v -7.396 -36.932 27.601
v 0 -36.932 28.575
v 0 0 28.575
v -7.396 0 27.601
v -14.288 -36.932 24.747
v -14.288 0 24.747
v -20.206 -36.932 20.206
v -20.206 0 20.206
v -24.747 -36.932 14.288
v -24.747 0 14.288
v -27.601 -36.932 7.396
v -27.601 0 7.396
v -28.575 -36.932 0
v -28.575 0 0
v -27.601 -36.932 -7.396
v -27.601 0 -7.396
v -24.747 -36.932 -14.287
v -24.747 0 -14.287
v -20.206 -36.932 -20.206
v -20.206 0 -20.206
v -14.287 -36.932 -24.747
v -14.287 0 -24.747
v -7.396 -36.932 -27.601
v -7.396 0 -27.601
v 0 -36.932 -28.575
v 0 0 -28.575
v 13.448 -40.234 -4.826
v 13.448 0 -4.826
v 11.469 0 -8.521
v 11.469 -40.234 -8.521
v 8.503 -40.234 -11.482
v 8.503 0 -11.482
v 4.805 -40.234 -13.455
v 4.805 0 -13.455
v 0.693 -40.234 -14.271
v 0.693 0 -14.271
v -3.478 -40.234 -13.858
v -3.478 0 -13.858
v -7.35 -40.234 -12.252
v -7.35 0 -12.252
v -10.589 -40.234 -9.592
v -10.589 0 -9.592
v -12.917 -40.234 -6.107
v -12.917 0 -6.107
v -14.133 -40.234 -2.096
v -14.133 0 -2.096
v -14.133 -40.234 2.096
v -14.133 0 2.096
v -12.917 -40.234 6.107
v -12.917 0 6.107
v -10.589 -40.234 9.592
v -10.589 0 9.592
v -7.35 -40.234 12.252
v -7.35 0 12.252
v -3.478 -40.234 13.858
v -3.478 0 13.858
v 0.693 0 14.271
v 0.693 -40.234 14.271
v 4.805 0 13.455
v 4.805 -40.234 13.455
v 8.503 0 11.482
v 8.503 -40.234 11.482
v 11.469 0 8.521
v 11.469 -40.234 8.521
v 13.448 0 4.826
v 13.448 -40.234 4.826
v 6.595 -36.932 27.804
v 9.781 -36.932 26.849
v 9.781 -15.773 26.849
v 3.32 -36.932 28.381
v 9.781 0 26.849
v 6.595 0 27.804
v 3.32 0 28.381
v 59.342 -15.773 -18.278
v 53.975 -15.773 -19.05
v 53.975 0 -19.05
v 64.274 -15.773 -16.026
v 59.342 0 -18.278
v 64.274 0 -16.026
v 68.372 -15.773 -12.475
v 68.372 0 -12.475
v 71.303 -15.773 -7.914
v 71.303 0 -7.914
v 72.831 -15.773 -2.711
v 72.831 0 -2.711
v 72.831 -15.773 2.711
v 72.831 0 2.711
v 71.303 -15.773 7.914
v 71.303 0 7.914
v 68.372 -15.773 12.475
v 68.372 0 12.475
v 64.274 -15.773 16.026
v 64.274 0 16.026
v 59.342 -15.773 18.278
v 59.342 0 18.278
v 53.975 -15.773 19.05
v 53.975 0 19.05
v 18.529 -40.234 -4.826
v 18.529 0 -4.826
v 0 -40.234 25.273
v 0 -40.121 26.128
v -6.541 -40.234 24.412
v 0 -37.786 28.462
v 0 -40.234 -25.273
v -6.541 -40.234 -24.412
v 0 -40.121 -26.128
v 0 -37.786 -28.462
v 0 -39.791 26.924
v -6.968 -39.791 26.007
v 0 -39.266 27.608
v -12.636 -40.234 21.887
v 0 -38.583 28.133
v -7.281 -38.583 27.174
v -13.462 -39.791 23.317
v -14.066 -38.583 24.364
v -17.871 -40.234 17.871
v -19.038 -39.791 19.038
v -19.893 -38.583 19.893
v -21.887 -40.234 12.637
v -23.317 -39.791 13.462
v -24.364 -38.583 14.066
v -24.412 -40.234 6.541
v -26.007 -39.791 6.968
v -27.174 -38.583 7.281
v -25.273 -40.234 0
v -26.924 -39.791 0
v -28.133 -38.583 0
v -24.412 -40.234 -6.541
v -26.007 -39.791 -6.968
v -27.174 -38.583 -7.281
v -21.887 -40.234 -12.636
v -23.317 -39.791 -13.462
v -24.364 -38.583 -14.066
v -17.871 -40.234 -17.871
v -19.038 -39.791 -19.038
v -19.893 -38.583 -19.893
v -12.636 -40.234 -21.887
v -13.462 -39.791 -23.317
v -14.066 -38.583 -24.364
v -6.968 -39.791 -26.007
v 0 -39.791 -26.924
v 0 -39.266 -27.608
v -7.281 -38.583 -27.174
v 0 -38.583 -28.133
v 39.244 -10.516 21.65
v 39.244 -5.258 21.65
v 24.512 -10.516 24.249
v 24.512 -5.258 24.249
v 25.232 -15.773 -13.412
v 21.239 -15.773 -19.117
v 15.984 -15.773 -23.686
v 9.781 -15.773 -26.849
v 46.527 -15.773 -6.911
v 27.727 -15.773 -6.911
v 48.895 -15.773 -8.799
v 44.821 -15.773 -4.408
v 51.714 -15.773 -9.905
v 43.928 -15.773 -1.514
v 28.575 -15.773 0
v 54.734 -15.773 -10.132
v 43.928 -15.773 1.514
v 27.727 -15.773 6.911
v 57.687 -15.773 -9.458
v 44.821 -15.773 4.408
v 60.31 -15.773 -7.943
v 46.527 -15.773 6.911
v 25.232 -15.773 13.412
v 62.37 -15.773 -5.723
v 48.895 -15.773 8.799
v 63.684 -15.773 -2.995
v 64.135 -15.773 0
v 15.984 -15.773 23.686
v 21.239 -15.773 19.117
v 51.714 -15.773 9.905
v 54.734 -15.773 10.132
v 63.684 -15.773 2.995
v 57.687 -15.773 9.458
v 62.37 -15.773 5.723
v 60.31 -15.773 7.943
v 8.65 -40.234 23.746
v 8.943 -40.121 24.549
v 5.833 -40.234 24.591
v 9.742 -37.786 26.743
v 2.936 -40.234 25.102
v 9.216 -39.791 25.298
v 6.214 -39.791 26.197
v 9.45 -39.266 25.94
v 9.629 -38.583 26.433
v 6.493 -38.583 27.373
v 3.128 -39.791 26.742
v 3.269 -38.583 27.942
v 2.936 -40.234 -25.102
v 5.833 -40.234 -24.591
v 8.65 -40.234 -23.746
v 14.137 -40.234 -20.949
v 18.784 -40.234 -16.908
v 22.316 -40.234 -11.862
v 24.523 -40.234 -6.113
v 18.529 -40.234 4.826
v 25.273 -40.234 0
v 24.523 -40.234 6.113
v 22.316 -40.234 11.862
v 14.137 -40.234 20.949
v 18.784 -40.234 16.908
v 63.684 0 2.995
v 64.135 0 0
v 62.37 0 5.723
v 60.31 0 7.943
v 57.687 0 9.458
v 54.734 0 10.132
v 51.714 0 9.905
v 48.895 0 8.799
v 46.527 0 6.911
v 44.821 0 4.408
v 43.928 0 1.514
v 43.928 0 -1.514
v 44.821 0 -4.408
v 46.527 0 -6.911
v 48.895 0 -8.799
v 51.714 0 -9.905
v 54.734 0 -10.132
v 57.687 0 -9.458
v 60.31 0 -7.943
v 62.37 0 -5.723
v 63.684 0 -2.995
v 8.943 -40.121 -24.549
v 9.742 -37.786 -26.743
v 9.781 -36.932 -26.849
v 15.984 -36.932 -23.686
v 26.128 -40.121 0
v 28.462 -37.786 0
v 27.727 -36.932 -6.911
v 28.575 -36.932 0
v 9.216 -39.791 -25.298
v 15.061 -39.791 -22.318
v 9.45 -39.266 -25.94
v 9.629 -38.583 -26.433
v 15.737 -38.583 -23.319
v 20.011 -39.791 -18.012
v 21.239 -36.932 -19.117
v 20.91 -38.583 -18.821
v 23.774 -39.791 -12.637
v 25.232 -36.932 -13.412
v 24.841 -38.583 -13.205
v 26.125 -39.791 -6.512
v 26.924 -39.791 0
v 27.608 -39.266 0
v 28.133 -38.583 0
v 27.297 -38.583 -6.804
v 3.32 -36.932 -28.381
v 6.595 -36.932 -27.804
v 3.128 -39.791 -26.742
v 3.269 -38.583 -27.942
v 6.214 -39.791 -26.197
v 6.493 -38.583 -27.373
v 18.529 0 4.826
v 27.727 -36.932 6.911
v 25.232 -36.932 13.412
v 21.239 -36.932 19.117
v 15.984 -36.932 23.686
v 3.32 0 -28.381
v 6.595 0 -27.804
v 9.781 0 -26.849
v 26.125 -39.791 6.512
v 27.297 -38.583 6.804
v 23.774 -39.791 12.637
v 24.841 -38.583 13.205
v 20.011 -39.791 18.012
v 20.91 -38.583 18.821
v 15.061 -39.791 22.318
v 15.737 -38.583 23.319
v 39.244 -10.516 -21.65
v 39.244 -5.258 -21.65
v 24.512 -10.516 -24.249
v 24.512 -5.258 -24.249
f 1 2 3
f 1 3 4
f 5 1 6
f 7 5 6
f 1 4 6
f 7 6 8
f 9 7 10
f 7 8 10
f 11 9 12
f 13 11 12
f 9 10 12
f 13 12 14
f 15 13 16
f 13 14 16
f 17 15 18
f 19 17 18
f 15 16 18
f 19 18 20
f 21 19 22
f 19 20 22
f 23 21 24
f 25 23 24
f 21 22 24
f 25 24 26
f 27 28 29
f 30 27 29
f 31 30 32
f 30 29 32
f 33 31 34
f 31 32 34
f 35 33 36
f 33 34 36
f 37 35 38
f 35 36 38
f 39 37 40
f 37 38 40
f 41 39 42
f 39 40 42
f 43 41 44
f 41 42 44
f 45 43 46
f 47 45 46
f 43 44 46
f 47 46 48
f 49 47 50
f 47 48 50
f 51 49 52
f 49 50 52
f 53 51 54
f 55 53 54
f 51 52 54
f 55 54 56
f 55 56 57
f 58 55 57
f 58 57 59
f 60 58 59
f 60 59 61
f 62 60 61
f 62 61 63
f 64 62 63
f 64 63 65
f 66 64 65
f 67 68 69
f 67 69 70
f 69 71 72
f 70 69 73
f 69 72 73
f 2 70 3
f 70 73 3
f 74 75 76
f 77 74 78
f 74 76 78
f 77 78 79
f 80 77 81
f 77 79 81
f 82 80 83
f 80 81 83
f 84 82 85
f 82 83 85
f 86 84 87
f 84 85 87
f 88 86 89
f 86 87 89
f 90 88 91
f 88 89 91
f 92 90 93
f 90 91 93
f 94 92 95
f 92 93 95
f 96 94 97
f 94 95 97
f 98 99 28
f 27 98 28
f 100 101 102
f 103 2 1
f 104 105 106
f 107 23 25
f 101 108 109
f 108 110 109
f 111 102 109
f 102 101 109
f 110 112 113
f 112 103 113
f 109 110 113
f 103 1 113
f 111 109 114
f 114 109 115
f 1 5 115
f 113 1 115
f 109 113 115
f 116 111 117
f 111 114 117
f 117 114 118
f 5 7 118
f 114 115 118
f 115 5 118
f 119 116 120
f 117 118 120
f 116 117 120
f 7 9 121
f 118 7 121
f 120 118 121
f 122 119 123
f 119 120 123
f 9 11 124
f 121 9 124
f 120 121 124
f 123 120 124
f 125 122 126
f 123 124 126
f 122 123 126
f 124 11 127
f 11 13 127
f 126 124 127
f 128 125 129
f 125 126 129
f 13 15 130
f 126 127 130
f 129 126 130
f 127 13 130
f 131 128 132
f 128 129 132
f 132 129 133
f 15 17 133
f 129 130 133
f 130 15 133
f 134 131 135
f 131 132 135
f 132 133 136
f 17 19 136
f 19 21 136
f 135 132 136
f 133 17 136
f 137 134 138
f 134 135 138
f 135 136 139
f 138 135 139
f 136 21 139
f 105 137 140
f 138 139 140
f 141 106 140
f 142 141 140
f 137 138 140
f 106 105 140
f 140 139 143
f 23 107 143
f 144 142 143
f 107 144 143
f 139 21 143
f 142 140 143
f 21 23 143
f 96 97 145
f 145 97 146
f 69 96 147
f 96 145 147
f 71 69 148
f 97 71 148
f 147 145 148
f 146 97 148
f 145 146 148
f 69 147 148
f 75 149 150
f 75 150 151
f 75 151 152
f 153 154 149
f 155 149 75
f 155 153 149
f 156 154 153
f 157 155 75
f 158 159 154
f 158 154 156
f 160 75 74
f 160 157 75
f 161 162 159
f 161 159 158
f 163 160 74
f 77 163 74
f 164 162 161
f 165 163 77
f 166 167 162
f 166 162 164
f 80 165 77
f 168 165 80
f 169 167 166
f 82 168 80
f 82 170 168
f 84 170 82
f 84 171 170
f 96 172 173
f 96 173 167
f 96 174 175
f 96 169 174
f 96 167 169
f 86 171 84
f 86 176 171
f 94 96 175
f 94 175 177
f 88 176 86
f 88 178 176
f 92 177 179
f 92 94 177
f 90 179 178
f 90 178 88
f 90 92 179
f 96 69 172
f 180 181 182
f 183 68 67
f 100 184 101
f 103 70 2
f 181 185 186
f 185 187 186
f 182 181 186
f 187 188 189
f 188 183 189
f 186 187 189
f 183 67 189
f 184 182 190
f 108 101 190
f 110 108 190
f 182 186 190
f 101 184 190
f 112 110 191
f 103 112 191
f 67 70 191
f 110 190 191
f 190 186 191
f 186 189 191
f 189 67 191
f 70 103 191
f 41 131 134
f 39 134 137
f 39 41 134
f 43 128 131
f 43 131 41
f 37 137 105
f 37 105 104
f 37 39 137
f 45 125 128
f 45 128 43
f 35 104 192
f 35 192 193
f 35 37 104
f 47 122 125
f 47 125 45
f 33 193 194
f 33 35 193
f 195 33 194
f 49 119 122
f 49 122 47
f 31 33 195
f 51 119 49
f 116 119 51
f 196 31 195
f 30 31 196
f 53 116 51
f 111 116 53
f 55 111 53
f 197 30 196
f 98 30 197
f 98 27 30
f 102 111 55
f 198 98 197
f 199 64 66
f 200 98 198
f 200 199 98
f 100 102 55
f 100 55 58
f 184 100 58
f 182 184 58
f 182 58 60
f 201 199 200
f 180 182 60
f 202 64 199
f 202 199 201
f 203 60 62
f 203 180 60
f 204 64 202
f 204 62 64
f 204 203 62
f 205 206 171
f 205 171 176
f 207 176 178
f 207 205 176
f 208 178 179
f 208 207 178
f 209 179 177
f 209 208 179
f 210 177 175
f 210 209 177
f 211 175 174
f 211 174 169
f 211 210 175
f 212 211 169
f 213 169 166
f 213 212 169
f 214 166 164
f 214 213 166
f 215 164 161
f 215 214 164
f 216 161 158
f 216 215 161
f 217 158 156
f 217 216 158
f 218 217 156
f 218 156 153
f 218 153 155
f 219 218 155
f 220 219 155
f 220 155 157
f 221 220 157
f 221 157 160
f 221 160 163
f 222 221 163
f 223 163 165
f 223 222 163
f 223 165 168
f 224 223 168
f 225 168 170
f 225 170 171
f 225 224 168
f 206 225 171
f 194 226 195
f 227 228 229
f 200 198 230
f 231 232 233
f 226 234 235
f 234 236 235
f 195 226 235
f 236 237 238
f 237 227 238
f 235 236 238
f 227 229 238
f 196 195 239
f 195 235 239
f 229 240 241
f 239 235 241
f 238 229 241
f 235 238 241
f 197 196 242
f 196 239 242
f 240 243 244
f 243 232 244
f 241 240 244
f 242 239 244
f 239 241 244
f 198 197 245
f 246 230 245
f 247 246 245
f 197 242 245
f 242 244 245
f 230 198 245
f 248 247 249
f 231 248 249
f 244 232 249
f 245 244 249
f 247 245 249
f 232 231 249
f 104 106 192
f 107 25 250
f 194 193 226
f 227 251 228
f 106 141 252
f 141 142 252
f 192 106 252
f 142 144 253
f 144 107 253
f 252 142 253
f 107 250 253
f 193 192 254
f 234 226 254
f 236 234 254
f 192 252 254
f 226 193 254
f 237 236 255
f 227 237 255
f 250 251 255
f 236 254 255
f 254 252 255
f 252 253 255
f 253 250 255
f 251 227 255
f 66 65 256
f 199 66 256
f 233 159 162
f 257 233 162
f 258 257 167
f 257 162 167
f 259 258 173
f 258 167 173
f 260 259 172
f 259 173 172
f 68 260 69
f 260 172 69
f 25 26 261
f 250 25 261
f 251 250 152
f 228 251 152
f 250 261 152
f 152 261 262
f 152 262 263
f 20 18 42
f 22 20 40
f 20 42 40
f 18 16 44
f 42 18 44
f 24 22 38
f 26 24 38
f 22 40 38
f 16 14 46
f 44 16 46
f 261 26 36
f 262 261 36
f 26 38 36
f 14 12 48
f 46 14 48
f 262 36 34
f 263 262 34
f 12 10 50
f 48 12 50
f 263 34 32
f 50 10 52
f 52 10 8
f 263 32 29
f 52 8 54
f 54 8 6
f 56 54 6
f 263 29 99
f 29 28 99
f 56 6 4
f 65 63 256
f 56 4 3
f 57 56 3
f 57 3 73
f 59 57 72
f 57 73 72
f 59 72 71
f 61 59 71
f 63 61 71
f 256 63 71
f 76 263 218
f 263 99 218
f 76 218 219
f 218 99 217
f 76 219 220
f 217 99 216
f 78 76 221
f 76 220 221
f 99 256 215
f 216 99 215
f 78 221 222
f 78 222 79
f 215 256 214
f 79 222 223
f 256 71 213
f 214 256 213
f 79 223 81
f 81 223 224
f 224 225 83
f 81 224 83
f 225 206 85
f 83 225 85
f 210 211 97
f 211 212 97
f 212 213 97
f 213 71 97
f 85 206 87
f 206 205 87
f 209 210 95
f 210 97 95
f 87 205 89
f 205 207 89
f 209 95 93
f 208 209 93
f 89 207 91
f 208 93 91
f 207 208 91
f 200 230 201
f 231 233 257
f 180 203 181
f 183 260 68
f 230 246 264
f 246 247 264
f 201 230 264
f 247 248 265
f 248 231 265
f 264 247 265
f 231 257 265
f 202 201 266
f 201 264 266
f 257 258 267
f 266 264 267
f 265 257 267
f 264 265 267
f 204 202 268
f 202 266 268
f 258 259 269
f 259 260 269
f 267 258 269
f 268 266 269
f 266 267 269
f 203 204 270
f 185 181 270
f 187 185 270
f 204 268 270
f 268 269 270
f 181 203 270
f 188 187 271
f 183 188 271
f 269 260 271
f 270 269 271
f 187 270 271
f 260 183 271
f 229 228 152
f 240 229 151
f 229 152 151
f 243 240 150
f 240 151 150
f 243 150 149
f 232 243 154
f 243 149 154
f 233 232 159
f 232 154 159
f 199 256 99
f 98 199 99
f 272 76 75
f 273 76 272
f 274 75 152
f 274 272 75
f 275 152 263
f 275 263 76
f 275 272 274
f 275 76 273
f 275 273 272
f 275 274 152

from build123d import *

# Parameters (mm, degrees)
F1_DEPTH = 40.2336
F0_R     = 10.16
F2_DEPTH = 15.7734
F3_R     = 3.302


with BuildPart() as f1:
    # F0 (on Front) → F1 (new body)
    with BuildSketch(Plane.XZ):
        with BuildLine():
            add(Edge.make_bspline(
                [(9.780704698, 26.8489932886), (6.5204697987, 27.4243288591), (3.2602348993, 27.9996644295), (0, 28.575)],
                knots=[44.8771660598, 44.8771660598, 44.8771660598, 44.8771660598, 54.8089978927, 54.8089978927, 54.8089978927, 54.8089978927], degree=3))
            ThreePointArc((0, 28.575), (-28.575, 0), (0, -28.575))
            add(Edge.make_bspline(
                [(9.780704698, -26.8489932886), (6.5204697987, -27.4243288591), (3.2602348993, -27.9996644295), (0, -28.575)],
                knots=[44.8771660598, 44.8771660598, 44.8771660598, 44.8771660598, 54.8089978927, 54.8089978927, 54.8089978927, 54.8089978927], degree=3))
            ThreePointArc((9.780704698, -26.8489932886), (23.4095521288, -16.3866864902), (28.575, 0))
            ThreePointArc((28.575, 0), (23.4095521288, 16.3866864902), (9.780704698, 26.8489932886))
        make_face()
        with BuildLine():
            ThreePointArc((13.4477648793, -4.826), (-14.2875, 0), (13.4477648793, 4.826))
            Line((13.4477648793, 4.826), (18.5293, 4.826))
            Line((18.5293, 4.826), (18.5293, -4.826))
            Line((18.5293, -4.826), (13.4477648793, -4.826))
        make_face(mode=Mode.SUBTRACT)
        with BuildLine():
            ThreePointArc((9.780704698, 26.8489932886), (4.9659159165, 28.1401901932), (0, 28.575))
            add(Edge.make_bspline(
                [(9.780704698, 26.8489932886), (6.5204697987, 27.4243288591), (3.2602348993, 27.9996644295), (0, 28.575)],
                knots=[44.8771660598, 44.8771660598, 44.8771660598, 44.8771660598, 54.8089978927, 54.8089978927, 54.8089978927, 54.8089978927], degree=3))
        make_face()
        with BuildLine():
            add(Edge.make_bspline(
                [(9.780704698, -26.8489932886), (6.5204697987, -27.4243288591), (3.2602348993, -27.9996644295), (0, -28.575)],
                knots=[44.8771660598, 44.8771660598, 44.8771660598, 44.8771660598, 54.8089978927, 54.8089978927, 54.8089978927, 54.8089978927], degree=3))
            ThreePointArc((0, -28.575), (4.9659159165, -28.1401901932), (9.780704698, -26.8489932886))
        make_face()
    extrude(amount=F1_DEPTH)

    # F0 (on Front) → F2 (join)
    with BuildSketch(Plane.XZ):
        with BuildLine():
            add(Edge.make_bspline(
                [(9.780704698, 26.8489932886), (6.5204697987, 27.4243288591), (3.2602348993, 27.9996644295), (0, 28.575)],
                knots=[44.8771660598, 44.8771660598, 44.8771660598, 44.8771660598, 54.8089978927, 54.8089978927, 54.8089978927, 54.8089978927], degree=3))
            ThreePointArc((0, 28.575), (-28.575, 0), (0, -28.575))
            add(Edge.make_bspline(
                [(9.780704698, -26.8489932886), (6.5204697987, -27.4243288591), (3.2602348993, -27.9996644295), (0, -28.575)],
                knots=[44.8771660598, 44.8771660598, 44.8771660598, 44.8771660598, 54.8089978927, 54.8089978927, 54.8089978927, 54.8089978927], degree=3))
            ThreePointArc((9.780704698, -26.8489932886), (23.4095521288, -16.3866864902), (28.575, 0))
            ThreePointArc((28.575, 0), (23.4095521288, 16.3866864902), (9.780704698, 26.8489932886))
        make_face()
        with BuildLine():
            ThreePointArc((13.4477648793, -4.826), (-14.2875, 0), (13.4477648793, 4.826))
            Line((13.4477648793, 4.826), (18.5293, 4.826))
            Line((18.5293, 4.826), (18.5293, -4.826))
            Line((18.5293, -4.826), (13.4477648793, -4.826))
        make_face(mode=Mode.SUBTRACT)
        with BuildLine():
            ThreePointArc((9.780704698, 26.8489932886), (4.9659159165, 28.1401901932), (0, 28.575))
            add(Edge.make_bspline(
                [(9.780704698, 26.8489932886), (6.5204697987, 27.4243288591), (3.2602348993, 27.9996644295), (0, 28.575)],
                knots=[44.8771660598, 44.8771660598, 44.8771660598, 44.8771660598, 54.8089978927, 54.8089978927, 54.8089978927, 54.8089978927], degree=3))
        make_face()
        with BuildLine():
            add(Edge.make_bspline(
                [(9.780704698, -26.8489932886), (6.5204697987, -27.4243288591), (3.2602348993, -27.9996644295), (0, -28.575)],
                knots=[44.8771660598, 44.8771660598, 44.8771660598, 44.8771660598, 54.8089978927, 54.8089978927, 54.8089978927, 54.8089978927], degree=3))
            ThreePointArc((0, -28.575), (4.9659159165, -28.1401901932), (9.780704698, -26.8489932886))
        make_face()
        with BuildLine():
            add(Edge.make_bspline(
                [(53.975, 19.05), (39.2435682327, 21.6496644295), (24.5121364653, 24.2493288591), (9.780704698, 26.8489932886)],
                knots=[0, 0, 0, 0, 44.8771660598, 44.8771660598, 44.8771660598, 44.8771660598], degree=3))
            ThreePointArc((9.780704698, 26.8489932886), (23.4095521288, 16.3866864902), (28.575, 0))
            ThreePointArc((28.575, 0), (23.4095521288, -16.3866864902), (9.780704698, -26.8489932886))
            add(Edge.make_bspline(
                [(53.975, -19.05), (39.2435682327, -21.6496644295), (24.5121364653, -24.2493288591), (9.780704698, -26.8489932886)],
                knots=[0, 0, 0, 0, 44.8771660598, 44.8771660598, 44.8771660598, 44.8771660598], degree=3))
            ThreePointArc((53.975, -19.05), (73.025, 0), (53.975, 19.05))
        make_face()
        with Locations((53.975, 0)):
            Circle(F0_R, mode=Mode.SUBTRACT)
    extrude(amount=F2_DEPTH)

    # F3
    f3_edges = [f1.edges().sort_by_distance(p)[0] for p in [
        (0, -40.2336, 28.575),
    ]]
    fillet(f3_edges, radius=F3_R)


solid = f1.part
